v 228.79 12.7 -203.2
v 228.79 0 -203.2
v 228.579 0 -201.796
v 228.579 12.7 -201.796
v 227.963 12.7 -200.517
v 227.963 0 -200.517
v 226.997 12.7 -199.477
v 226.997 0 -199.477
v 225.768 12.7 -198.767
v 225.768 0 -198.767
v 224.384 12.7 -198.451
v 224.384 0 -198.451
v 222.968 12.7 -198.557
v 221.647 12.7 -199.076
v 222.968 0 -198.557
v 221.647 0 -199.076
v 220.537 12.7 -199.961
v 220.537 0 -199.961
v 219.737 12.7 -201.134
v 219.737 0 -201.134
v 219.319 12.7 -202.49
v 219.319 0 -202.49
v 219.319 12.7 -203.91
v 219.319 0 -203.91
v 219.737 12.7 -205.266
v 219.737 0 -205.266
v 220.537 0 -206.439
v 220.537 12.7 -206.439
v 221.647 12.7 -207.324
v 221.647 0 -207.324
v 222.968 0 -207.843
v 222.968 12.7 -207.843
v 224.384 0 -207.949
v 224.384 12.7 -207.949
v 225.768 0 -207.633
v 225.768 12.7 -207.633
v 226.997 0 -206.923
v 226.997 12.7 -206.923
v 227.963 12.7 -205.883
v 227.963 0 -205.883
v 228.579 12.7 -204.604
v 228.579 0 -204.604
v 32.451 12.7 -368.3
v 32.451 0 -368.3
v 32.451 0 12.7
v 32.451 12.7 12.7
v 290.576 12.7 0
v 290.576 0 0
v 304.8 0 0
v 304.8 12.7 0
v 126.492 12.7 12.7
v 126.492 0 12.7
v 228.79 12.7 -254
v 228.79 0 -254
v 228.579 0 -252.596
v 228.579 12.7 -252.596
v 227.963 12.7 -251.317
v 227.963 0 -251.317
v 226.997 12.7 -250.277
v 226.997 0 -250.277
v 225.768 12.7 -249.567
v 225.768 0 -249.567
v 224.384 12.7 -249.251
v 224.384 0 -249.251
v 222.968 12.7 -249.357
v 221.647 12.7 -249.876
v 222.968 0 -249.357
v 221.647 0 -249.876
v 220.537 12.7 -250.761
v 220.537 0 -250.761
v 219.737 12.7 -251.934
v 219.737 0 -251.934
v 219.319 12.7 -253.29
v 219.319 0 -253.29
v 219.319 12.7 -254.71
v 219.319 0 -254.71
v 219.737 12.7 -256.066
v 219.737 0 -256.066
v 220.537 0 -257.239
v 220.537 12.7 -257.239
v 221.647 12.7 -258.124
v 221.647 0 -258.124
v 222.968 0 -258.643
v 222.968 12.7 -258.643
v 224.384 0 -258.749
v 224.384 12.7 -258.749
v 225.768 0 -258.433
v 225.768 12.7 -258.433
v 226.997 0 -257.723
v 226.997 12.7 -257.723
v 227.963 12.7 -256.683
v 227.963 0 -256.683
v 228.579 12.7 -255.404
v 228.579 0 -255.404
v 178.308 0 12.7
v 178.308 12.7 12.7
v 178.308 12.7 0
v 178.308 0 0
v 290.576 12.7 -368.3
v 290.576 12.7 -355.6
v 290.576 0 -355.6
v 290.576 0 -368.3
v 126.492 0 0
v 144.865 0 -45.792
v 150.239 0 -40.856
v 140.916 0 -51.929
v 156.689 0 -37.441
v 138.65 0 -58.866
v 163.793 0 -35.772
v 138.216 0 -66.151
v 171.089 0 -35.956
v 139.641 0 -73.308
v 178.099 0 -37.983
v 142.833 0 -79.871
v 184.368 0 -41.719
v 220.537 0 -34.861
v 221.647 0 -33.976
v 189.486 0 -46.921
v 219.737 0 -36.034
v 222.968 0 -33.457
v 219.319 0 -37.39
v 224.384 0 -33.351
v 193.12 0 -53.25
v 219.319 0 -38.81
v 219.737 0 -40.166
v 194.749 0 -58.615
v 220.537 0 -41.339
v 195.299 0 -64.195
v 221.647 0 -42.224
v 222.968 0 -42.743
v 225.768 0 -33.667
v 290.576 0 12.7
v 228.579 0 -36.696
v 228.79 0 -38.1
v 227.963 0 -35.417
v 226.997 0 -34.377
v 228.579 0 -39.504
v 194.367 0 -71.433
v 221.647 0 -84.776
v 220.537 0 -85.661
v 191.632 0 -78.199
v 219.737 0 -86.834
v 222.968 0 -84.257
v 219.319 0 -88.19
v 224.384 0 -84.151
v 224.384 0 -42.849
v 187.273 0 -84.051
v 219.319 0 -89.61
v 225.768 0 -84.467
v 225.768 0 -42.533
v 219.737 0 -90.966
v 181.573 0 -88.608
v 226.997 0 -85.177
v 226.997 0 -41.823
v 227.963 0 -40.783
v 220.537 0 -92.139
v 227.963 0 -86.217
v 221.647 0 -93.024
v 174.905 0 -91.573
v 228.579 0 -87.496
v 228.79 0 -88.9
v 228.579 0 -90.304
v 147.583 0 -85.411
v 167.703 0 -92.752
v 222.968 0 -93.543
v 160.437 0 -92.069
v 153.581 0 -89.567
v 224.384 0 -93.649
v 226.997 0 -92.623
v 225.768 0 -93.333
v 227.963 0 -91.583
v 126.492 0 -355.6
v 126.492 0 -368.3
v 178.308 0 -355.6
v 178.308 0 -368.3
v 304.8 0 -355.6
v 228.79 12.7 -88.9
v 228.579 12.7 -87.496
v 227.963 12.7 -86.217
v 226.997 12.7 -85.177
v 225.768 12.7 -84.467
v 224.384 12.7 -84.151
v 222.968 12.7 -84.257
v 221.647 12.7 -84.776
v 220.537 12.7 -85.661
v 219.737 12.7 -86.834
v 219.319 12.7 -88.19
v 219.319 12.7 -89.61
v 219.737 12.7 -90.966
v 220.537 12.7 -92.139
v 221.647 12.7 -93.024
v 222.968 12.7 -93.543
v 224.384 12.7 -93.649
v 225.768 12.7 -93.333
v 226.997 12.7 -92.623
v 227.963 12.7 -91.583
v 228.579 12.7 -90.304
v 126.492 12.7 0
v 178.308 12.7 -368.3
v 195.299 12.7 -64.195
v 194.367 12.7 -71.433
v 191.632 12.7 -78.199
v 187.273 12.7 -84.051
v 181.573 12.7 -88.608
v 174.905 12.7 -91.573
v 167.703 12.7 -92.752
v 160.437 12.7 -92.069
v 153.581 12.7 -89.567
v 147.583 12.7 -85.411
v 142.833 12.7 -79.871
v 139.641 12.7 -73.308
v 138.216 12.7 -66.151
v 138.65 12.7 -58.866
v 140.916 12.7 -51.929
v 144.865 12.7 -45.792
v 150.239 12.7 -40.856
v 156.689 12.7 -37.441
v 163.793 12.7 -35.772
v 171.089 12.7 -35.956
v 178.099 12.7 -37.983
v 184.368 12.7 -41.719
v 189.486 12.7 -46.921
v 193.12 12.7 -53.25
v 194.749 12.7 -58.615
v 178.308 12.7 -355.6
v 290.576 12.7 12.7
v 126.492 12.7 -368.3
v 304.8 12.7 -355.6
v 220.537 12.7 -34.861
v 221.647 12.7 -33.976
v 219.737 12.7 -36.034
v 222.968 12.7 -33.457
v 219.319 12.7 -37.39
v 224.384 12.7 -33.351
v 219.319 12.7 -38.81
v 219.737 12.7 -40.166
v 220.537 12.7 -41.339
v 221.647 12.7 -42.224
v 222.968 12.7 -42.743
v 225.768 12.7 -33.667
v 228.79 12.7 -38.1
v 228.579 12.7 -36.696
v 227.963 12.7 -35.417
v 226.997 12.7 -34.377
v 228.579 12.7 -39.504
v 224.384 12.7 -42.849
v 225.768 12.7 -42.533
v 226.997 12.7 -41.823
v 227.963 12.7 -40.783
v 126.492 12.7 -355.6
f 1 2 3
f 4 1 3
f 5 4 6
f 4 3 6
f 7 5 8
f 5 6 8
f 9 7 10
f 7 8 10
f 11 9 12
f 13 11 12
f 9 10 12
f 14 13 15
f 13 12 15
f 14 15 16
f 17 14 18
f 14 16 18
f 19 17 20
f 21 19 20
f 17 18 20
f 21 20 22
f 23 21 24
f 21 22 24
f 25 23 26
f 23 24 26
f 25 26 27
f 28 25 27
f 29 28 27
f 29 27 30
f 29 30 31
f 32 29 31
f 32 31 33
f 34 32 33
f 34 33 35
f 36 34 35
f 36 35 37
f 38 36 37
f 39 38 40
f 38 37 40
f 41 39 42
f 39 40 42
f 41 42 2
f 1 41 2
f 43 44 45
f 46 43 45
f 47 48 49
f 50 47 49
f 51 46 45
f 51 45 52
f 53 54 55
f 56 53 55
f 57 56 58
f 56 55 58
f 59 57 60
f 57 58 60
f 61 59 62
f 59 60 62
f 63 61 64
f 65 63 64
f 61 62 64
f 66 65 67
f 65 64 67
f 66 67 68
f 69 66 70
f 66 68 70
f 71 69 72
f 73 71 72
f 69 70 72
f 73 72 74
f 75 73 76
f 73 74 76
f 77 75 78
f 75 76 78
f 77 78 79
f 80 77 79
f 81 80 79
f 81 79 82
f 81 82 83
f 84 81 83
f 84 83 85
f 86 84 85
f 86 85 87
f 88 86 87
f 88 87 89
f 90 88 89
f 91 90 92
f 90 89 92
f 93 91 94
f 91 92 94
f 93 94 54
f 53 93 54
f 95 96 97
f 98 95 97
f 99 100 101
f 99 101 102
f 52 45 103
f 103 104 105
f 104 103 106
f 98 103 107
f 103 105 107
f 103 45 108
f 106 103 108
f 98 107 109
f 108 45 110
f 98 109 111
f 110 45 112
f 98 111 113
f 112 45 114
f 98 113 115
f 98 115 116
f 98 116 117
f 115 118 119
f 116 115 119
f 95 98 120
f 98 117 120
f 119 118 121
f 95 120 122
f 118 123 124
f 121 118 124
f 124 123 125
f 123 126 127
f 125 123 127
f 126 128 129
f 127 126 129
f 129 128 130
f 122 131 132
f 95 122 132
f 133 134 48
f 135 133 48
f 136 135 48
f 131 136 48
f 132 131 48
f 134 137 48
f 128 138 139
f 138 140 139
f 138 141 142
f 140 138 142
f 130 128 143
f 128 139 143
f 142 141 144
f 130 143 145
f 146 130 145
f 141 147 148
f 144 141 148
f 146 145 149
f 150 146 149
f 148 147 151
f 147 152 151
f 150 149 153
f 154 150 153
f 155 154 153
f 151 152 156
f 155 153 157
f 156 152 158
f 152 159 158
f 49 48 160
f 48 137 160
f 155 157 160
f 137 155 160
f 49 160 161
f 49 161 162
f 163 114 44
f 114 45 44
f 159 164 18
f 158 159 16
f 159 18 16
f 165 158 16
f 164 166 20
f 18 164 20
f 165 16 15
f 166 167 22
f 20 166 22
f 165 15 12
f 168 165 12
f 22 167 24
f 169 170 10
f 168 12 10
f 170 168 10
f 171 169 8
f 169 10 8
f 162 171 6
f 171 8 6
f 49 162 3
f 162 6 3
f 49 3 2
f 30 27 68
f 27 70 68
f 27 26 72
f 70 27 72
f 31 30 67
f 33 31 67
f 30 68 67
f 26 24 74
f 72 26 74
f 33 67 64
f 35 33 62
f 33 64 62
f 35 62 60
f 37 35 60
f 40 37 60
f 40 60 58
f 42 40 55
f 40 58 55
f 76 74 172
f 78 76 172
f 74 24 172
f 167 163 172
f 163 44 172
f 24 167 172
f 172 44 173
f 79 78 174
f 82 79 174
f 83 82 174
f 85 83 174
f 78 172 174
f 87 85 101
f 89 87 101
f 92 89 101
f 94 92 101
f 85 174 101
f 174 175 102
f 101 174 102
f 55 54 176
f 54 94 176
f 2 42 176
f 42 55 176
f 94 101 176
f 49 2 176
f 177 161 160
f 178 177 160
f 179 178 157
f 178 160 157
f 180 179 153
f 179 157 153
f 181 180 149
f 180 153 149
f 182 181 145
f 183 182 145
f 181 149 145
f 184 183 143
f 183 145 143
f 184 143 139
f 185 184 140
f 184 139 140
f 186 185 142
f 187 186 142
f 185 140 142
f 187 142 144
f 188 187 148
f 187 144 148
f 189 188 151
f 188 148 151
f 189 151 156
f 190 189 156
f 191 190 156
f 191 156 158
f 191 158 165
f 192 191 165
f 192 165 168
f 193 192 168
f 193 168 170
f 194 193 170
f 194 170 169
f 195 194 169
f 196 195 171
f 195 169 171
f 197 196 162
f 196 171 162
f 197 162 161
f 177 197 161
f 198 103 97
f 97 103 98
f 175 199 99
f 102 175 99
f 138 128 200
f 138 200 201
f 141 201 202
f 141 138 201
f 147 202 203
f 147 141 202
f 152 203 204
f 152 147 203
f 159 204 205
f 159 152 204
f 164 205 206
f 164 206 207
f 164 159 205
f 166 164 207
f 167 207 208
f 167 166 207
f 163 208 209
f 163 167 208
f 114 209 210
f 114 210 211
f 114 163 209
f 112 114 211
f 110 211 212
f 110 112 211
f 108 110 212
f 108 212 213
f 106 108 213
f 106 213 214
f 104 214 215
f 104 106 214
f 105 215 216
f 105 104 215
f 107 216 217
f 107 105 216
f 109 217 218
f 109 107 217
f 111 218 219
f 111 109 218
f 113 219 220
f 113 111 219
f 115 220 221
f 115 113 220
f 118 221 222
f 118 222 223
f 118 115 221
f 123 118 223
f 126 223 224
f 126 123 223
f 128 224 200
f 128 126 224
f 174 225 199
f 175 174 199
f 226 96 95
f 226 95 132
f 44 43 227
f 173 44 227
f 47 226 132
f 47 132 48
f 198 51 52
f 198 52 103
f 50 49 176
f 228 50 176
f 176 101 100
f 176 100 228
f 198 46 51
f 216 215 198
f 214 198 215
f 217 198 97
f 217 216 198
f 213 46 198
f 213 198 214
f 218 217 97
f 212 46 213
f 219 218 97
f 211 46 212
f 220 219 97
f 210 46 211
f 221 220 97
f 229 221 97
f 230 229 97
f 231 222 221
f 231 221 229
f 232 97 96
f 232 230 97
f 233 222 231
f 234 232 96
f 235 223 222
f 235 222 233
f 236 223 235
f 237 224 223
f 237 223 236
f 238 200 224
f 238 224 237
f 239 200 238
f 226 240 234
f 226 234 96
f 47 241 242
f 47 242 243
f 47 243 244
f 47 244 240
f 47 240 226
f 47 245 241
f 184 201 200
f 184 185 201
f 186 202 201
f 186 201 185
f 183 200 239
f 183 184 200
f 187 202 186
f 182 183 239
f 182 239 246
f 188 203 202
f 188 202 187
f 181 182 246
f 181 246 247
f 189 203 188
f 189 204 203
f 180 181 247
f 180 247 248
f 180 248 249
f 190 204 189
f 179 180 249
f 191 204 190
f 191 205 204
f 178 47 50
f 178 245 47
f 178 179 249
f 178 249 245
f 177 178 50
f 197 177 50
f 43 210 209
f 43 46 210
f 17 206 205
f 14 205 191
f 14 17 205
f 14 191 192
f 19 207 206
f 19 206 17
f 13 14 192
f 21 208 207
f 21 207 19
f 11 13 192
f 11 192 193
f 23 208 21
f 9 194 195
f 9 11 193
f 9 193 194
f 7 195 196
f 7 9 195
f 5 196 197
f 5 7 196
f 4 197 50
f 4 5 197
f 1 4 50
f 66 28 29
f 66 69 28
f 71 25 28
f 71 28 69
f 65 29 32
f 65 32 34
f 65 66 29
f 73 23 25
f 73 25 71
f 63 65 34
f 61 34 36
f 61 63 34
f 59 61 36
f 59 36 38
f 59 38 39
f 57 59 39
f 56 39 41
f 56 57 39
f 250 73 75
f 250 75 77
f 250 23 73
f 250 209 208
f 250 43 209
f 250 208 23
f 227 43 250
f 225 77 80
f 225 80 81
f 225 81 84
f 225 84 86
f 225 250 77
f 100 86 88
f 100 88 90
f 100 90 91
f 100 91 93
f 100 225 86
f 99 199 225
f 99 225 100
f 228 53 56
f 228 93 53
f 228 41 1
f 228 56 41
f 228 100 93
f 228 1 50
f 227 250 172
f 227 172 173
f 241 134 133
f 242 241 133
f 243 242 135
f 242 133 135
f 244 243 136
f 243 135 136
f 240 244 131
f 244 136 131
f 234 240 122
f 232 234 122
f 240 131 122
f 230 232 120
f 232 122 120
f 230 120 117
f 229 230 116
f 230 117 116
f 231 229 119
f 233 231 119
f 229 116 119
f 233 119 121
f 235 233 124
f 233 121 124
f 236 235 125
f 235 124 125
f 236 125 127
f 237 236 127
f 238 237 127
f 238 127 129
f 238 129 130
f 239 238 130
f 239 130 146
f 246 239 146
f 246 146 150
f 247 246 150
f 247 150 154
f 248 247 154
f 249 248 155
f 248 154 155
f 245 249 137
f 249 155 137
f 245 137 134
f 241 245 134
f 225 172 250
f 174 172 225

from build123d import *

# Parameters (mm, degrees)
SKETCH1_W           = 304.8
SKETCH1_H           = 355.6
SKETCH1_RX          = 28.575
SKETCH1_RY          = 28.573991153
BOSS_EXTRUDE1_DEPTH = 12.7
SKETCH2_R           = 4.7625
CUT_EXTRUDE1_DEPTH  = 12.7
SKETCH3_W           = 112.268
SKETCH3_H           = 12.7
BOSS_EXTRUDE2_DEPTH = 12.7
SKETCH5_W           = 38.383719954
SKETCH5_H           = 381
CUT_EXTRUDE2_DEPTH  = 13.7


with BuildPart() as part:
    # Sketch1 → Boss-Extrude1 (new body)
    with BuildSketch(Plane(origin=(0, 0, 0), x_dir=(1, 0, 0), z_dir=(0, 1, 0))):
        with Locations((152.4, 177.8)):
            Rectangle(SKETCH1_W, SKETCH1_H)
        with Locations(Location((166.724174942, 64.195003676), (0, 0, 0))):
            Ellipse(SKETCH1_RX, SKETCH1_RY, mode=Mode.SUBTRACT)
    extrude(amount=BOSS_EXTRUDE1_DEPTH)

    # Sketch2 → Cut-Extrude1 (cut)
    with BuildSketch(Plane.XZ):
        with Locations((224.028, -38.1)):
            Circle(SKETCH2_R)
        with Locations((224.028, -88.9)):
            Circle(SKETCH2_R)
        with Locations((224.028, -203.2)):
            Circle(SKETCH2_R)
        with Locations((224.028, -254)):
            Circle(SKETCH2_R)
    extrude(amount=-CUT_EXTRUDE1_DEPTH, mode=Mode.SUBTRACT)

    # Sketch3 → Boss-Extrude2 (add)
    with BuildSketch(Plane(origin=(0, 12.7, 0), x_dir=(1, 0, 0), z_dir=(0, 1, 0))):
        with Locations((70.358, 361.95)):
            Rectangle(SKETCH3_W, SKETCH3_H)
        with Locations((234.442, 361.95)):
            Rectangle(SKETCH3_W, SKETCH3_H)
        with Locations((234.442, -6.35)):
            Rectangle(SKETCH3_W, SKETCH3_H)
        with Locations((70.358, -6.35)):
            Rectangle(SKETCH3_W, SKETCH3_H)
    extrude(amount=-BOSS_EXTRUDE2_DEPTH)

    # Sketch5 → Cut-Extrude2 (cut, through all)
    with BuildSketch(Plane.XZ):
        with Locations((13.259015168, -177.8)):
            Rectangle(SKETCH5_W, SKETCH5_H)
    extrude(amount=-CUT_EXTRUDE2_DEPTH, mode=Mode.SUBTRACT)


solid = part.part
